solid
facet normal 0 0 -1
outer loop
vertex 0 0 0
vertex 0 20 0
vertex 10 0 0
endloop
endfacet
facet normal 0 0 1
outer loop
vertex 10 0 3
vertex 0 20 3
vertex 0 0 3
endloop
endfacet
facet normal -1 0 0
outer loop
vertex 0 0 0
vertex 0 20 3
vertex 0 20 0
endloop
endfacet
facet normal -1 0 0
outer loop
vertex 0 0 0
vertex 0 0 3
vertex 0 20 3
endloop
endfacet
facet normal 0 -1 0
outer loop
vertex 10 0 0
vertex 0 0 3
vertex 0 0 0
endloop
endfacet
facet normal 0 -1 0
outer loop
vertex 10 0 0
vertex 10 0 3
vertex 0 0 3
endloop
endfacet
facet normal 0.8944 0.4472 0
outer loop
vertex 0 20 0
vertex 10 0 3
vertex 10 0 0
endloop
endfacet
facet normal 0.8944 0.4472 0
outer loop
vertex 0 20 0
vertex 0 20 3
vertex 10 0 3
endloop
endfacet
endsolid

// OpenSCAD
module triangle(a, b, h) {
    points = [
        [0, 0],
        [a, 0],
        [0, b]
    ];

    linear_extrude(h)
    polygon(points);
}

triangle(10, 20, 3);
